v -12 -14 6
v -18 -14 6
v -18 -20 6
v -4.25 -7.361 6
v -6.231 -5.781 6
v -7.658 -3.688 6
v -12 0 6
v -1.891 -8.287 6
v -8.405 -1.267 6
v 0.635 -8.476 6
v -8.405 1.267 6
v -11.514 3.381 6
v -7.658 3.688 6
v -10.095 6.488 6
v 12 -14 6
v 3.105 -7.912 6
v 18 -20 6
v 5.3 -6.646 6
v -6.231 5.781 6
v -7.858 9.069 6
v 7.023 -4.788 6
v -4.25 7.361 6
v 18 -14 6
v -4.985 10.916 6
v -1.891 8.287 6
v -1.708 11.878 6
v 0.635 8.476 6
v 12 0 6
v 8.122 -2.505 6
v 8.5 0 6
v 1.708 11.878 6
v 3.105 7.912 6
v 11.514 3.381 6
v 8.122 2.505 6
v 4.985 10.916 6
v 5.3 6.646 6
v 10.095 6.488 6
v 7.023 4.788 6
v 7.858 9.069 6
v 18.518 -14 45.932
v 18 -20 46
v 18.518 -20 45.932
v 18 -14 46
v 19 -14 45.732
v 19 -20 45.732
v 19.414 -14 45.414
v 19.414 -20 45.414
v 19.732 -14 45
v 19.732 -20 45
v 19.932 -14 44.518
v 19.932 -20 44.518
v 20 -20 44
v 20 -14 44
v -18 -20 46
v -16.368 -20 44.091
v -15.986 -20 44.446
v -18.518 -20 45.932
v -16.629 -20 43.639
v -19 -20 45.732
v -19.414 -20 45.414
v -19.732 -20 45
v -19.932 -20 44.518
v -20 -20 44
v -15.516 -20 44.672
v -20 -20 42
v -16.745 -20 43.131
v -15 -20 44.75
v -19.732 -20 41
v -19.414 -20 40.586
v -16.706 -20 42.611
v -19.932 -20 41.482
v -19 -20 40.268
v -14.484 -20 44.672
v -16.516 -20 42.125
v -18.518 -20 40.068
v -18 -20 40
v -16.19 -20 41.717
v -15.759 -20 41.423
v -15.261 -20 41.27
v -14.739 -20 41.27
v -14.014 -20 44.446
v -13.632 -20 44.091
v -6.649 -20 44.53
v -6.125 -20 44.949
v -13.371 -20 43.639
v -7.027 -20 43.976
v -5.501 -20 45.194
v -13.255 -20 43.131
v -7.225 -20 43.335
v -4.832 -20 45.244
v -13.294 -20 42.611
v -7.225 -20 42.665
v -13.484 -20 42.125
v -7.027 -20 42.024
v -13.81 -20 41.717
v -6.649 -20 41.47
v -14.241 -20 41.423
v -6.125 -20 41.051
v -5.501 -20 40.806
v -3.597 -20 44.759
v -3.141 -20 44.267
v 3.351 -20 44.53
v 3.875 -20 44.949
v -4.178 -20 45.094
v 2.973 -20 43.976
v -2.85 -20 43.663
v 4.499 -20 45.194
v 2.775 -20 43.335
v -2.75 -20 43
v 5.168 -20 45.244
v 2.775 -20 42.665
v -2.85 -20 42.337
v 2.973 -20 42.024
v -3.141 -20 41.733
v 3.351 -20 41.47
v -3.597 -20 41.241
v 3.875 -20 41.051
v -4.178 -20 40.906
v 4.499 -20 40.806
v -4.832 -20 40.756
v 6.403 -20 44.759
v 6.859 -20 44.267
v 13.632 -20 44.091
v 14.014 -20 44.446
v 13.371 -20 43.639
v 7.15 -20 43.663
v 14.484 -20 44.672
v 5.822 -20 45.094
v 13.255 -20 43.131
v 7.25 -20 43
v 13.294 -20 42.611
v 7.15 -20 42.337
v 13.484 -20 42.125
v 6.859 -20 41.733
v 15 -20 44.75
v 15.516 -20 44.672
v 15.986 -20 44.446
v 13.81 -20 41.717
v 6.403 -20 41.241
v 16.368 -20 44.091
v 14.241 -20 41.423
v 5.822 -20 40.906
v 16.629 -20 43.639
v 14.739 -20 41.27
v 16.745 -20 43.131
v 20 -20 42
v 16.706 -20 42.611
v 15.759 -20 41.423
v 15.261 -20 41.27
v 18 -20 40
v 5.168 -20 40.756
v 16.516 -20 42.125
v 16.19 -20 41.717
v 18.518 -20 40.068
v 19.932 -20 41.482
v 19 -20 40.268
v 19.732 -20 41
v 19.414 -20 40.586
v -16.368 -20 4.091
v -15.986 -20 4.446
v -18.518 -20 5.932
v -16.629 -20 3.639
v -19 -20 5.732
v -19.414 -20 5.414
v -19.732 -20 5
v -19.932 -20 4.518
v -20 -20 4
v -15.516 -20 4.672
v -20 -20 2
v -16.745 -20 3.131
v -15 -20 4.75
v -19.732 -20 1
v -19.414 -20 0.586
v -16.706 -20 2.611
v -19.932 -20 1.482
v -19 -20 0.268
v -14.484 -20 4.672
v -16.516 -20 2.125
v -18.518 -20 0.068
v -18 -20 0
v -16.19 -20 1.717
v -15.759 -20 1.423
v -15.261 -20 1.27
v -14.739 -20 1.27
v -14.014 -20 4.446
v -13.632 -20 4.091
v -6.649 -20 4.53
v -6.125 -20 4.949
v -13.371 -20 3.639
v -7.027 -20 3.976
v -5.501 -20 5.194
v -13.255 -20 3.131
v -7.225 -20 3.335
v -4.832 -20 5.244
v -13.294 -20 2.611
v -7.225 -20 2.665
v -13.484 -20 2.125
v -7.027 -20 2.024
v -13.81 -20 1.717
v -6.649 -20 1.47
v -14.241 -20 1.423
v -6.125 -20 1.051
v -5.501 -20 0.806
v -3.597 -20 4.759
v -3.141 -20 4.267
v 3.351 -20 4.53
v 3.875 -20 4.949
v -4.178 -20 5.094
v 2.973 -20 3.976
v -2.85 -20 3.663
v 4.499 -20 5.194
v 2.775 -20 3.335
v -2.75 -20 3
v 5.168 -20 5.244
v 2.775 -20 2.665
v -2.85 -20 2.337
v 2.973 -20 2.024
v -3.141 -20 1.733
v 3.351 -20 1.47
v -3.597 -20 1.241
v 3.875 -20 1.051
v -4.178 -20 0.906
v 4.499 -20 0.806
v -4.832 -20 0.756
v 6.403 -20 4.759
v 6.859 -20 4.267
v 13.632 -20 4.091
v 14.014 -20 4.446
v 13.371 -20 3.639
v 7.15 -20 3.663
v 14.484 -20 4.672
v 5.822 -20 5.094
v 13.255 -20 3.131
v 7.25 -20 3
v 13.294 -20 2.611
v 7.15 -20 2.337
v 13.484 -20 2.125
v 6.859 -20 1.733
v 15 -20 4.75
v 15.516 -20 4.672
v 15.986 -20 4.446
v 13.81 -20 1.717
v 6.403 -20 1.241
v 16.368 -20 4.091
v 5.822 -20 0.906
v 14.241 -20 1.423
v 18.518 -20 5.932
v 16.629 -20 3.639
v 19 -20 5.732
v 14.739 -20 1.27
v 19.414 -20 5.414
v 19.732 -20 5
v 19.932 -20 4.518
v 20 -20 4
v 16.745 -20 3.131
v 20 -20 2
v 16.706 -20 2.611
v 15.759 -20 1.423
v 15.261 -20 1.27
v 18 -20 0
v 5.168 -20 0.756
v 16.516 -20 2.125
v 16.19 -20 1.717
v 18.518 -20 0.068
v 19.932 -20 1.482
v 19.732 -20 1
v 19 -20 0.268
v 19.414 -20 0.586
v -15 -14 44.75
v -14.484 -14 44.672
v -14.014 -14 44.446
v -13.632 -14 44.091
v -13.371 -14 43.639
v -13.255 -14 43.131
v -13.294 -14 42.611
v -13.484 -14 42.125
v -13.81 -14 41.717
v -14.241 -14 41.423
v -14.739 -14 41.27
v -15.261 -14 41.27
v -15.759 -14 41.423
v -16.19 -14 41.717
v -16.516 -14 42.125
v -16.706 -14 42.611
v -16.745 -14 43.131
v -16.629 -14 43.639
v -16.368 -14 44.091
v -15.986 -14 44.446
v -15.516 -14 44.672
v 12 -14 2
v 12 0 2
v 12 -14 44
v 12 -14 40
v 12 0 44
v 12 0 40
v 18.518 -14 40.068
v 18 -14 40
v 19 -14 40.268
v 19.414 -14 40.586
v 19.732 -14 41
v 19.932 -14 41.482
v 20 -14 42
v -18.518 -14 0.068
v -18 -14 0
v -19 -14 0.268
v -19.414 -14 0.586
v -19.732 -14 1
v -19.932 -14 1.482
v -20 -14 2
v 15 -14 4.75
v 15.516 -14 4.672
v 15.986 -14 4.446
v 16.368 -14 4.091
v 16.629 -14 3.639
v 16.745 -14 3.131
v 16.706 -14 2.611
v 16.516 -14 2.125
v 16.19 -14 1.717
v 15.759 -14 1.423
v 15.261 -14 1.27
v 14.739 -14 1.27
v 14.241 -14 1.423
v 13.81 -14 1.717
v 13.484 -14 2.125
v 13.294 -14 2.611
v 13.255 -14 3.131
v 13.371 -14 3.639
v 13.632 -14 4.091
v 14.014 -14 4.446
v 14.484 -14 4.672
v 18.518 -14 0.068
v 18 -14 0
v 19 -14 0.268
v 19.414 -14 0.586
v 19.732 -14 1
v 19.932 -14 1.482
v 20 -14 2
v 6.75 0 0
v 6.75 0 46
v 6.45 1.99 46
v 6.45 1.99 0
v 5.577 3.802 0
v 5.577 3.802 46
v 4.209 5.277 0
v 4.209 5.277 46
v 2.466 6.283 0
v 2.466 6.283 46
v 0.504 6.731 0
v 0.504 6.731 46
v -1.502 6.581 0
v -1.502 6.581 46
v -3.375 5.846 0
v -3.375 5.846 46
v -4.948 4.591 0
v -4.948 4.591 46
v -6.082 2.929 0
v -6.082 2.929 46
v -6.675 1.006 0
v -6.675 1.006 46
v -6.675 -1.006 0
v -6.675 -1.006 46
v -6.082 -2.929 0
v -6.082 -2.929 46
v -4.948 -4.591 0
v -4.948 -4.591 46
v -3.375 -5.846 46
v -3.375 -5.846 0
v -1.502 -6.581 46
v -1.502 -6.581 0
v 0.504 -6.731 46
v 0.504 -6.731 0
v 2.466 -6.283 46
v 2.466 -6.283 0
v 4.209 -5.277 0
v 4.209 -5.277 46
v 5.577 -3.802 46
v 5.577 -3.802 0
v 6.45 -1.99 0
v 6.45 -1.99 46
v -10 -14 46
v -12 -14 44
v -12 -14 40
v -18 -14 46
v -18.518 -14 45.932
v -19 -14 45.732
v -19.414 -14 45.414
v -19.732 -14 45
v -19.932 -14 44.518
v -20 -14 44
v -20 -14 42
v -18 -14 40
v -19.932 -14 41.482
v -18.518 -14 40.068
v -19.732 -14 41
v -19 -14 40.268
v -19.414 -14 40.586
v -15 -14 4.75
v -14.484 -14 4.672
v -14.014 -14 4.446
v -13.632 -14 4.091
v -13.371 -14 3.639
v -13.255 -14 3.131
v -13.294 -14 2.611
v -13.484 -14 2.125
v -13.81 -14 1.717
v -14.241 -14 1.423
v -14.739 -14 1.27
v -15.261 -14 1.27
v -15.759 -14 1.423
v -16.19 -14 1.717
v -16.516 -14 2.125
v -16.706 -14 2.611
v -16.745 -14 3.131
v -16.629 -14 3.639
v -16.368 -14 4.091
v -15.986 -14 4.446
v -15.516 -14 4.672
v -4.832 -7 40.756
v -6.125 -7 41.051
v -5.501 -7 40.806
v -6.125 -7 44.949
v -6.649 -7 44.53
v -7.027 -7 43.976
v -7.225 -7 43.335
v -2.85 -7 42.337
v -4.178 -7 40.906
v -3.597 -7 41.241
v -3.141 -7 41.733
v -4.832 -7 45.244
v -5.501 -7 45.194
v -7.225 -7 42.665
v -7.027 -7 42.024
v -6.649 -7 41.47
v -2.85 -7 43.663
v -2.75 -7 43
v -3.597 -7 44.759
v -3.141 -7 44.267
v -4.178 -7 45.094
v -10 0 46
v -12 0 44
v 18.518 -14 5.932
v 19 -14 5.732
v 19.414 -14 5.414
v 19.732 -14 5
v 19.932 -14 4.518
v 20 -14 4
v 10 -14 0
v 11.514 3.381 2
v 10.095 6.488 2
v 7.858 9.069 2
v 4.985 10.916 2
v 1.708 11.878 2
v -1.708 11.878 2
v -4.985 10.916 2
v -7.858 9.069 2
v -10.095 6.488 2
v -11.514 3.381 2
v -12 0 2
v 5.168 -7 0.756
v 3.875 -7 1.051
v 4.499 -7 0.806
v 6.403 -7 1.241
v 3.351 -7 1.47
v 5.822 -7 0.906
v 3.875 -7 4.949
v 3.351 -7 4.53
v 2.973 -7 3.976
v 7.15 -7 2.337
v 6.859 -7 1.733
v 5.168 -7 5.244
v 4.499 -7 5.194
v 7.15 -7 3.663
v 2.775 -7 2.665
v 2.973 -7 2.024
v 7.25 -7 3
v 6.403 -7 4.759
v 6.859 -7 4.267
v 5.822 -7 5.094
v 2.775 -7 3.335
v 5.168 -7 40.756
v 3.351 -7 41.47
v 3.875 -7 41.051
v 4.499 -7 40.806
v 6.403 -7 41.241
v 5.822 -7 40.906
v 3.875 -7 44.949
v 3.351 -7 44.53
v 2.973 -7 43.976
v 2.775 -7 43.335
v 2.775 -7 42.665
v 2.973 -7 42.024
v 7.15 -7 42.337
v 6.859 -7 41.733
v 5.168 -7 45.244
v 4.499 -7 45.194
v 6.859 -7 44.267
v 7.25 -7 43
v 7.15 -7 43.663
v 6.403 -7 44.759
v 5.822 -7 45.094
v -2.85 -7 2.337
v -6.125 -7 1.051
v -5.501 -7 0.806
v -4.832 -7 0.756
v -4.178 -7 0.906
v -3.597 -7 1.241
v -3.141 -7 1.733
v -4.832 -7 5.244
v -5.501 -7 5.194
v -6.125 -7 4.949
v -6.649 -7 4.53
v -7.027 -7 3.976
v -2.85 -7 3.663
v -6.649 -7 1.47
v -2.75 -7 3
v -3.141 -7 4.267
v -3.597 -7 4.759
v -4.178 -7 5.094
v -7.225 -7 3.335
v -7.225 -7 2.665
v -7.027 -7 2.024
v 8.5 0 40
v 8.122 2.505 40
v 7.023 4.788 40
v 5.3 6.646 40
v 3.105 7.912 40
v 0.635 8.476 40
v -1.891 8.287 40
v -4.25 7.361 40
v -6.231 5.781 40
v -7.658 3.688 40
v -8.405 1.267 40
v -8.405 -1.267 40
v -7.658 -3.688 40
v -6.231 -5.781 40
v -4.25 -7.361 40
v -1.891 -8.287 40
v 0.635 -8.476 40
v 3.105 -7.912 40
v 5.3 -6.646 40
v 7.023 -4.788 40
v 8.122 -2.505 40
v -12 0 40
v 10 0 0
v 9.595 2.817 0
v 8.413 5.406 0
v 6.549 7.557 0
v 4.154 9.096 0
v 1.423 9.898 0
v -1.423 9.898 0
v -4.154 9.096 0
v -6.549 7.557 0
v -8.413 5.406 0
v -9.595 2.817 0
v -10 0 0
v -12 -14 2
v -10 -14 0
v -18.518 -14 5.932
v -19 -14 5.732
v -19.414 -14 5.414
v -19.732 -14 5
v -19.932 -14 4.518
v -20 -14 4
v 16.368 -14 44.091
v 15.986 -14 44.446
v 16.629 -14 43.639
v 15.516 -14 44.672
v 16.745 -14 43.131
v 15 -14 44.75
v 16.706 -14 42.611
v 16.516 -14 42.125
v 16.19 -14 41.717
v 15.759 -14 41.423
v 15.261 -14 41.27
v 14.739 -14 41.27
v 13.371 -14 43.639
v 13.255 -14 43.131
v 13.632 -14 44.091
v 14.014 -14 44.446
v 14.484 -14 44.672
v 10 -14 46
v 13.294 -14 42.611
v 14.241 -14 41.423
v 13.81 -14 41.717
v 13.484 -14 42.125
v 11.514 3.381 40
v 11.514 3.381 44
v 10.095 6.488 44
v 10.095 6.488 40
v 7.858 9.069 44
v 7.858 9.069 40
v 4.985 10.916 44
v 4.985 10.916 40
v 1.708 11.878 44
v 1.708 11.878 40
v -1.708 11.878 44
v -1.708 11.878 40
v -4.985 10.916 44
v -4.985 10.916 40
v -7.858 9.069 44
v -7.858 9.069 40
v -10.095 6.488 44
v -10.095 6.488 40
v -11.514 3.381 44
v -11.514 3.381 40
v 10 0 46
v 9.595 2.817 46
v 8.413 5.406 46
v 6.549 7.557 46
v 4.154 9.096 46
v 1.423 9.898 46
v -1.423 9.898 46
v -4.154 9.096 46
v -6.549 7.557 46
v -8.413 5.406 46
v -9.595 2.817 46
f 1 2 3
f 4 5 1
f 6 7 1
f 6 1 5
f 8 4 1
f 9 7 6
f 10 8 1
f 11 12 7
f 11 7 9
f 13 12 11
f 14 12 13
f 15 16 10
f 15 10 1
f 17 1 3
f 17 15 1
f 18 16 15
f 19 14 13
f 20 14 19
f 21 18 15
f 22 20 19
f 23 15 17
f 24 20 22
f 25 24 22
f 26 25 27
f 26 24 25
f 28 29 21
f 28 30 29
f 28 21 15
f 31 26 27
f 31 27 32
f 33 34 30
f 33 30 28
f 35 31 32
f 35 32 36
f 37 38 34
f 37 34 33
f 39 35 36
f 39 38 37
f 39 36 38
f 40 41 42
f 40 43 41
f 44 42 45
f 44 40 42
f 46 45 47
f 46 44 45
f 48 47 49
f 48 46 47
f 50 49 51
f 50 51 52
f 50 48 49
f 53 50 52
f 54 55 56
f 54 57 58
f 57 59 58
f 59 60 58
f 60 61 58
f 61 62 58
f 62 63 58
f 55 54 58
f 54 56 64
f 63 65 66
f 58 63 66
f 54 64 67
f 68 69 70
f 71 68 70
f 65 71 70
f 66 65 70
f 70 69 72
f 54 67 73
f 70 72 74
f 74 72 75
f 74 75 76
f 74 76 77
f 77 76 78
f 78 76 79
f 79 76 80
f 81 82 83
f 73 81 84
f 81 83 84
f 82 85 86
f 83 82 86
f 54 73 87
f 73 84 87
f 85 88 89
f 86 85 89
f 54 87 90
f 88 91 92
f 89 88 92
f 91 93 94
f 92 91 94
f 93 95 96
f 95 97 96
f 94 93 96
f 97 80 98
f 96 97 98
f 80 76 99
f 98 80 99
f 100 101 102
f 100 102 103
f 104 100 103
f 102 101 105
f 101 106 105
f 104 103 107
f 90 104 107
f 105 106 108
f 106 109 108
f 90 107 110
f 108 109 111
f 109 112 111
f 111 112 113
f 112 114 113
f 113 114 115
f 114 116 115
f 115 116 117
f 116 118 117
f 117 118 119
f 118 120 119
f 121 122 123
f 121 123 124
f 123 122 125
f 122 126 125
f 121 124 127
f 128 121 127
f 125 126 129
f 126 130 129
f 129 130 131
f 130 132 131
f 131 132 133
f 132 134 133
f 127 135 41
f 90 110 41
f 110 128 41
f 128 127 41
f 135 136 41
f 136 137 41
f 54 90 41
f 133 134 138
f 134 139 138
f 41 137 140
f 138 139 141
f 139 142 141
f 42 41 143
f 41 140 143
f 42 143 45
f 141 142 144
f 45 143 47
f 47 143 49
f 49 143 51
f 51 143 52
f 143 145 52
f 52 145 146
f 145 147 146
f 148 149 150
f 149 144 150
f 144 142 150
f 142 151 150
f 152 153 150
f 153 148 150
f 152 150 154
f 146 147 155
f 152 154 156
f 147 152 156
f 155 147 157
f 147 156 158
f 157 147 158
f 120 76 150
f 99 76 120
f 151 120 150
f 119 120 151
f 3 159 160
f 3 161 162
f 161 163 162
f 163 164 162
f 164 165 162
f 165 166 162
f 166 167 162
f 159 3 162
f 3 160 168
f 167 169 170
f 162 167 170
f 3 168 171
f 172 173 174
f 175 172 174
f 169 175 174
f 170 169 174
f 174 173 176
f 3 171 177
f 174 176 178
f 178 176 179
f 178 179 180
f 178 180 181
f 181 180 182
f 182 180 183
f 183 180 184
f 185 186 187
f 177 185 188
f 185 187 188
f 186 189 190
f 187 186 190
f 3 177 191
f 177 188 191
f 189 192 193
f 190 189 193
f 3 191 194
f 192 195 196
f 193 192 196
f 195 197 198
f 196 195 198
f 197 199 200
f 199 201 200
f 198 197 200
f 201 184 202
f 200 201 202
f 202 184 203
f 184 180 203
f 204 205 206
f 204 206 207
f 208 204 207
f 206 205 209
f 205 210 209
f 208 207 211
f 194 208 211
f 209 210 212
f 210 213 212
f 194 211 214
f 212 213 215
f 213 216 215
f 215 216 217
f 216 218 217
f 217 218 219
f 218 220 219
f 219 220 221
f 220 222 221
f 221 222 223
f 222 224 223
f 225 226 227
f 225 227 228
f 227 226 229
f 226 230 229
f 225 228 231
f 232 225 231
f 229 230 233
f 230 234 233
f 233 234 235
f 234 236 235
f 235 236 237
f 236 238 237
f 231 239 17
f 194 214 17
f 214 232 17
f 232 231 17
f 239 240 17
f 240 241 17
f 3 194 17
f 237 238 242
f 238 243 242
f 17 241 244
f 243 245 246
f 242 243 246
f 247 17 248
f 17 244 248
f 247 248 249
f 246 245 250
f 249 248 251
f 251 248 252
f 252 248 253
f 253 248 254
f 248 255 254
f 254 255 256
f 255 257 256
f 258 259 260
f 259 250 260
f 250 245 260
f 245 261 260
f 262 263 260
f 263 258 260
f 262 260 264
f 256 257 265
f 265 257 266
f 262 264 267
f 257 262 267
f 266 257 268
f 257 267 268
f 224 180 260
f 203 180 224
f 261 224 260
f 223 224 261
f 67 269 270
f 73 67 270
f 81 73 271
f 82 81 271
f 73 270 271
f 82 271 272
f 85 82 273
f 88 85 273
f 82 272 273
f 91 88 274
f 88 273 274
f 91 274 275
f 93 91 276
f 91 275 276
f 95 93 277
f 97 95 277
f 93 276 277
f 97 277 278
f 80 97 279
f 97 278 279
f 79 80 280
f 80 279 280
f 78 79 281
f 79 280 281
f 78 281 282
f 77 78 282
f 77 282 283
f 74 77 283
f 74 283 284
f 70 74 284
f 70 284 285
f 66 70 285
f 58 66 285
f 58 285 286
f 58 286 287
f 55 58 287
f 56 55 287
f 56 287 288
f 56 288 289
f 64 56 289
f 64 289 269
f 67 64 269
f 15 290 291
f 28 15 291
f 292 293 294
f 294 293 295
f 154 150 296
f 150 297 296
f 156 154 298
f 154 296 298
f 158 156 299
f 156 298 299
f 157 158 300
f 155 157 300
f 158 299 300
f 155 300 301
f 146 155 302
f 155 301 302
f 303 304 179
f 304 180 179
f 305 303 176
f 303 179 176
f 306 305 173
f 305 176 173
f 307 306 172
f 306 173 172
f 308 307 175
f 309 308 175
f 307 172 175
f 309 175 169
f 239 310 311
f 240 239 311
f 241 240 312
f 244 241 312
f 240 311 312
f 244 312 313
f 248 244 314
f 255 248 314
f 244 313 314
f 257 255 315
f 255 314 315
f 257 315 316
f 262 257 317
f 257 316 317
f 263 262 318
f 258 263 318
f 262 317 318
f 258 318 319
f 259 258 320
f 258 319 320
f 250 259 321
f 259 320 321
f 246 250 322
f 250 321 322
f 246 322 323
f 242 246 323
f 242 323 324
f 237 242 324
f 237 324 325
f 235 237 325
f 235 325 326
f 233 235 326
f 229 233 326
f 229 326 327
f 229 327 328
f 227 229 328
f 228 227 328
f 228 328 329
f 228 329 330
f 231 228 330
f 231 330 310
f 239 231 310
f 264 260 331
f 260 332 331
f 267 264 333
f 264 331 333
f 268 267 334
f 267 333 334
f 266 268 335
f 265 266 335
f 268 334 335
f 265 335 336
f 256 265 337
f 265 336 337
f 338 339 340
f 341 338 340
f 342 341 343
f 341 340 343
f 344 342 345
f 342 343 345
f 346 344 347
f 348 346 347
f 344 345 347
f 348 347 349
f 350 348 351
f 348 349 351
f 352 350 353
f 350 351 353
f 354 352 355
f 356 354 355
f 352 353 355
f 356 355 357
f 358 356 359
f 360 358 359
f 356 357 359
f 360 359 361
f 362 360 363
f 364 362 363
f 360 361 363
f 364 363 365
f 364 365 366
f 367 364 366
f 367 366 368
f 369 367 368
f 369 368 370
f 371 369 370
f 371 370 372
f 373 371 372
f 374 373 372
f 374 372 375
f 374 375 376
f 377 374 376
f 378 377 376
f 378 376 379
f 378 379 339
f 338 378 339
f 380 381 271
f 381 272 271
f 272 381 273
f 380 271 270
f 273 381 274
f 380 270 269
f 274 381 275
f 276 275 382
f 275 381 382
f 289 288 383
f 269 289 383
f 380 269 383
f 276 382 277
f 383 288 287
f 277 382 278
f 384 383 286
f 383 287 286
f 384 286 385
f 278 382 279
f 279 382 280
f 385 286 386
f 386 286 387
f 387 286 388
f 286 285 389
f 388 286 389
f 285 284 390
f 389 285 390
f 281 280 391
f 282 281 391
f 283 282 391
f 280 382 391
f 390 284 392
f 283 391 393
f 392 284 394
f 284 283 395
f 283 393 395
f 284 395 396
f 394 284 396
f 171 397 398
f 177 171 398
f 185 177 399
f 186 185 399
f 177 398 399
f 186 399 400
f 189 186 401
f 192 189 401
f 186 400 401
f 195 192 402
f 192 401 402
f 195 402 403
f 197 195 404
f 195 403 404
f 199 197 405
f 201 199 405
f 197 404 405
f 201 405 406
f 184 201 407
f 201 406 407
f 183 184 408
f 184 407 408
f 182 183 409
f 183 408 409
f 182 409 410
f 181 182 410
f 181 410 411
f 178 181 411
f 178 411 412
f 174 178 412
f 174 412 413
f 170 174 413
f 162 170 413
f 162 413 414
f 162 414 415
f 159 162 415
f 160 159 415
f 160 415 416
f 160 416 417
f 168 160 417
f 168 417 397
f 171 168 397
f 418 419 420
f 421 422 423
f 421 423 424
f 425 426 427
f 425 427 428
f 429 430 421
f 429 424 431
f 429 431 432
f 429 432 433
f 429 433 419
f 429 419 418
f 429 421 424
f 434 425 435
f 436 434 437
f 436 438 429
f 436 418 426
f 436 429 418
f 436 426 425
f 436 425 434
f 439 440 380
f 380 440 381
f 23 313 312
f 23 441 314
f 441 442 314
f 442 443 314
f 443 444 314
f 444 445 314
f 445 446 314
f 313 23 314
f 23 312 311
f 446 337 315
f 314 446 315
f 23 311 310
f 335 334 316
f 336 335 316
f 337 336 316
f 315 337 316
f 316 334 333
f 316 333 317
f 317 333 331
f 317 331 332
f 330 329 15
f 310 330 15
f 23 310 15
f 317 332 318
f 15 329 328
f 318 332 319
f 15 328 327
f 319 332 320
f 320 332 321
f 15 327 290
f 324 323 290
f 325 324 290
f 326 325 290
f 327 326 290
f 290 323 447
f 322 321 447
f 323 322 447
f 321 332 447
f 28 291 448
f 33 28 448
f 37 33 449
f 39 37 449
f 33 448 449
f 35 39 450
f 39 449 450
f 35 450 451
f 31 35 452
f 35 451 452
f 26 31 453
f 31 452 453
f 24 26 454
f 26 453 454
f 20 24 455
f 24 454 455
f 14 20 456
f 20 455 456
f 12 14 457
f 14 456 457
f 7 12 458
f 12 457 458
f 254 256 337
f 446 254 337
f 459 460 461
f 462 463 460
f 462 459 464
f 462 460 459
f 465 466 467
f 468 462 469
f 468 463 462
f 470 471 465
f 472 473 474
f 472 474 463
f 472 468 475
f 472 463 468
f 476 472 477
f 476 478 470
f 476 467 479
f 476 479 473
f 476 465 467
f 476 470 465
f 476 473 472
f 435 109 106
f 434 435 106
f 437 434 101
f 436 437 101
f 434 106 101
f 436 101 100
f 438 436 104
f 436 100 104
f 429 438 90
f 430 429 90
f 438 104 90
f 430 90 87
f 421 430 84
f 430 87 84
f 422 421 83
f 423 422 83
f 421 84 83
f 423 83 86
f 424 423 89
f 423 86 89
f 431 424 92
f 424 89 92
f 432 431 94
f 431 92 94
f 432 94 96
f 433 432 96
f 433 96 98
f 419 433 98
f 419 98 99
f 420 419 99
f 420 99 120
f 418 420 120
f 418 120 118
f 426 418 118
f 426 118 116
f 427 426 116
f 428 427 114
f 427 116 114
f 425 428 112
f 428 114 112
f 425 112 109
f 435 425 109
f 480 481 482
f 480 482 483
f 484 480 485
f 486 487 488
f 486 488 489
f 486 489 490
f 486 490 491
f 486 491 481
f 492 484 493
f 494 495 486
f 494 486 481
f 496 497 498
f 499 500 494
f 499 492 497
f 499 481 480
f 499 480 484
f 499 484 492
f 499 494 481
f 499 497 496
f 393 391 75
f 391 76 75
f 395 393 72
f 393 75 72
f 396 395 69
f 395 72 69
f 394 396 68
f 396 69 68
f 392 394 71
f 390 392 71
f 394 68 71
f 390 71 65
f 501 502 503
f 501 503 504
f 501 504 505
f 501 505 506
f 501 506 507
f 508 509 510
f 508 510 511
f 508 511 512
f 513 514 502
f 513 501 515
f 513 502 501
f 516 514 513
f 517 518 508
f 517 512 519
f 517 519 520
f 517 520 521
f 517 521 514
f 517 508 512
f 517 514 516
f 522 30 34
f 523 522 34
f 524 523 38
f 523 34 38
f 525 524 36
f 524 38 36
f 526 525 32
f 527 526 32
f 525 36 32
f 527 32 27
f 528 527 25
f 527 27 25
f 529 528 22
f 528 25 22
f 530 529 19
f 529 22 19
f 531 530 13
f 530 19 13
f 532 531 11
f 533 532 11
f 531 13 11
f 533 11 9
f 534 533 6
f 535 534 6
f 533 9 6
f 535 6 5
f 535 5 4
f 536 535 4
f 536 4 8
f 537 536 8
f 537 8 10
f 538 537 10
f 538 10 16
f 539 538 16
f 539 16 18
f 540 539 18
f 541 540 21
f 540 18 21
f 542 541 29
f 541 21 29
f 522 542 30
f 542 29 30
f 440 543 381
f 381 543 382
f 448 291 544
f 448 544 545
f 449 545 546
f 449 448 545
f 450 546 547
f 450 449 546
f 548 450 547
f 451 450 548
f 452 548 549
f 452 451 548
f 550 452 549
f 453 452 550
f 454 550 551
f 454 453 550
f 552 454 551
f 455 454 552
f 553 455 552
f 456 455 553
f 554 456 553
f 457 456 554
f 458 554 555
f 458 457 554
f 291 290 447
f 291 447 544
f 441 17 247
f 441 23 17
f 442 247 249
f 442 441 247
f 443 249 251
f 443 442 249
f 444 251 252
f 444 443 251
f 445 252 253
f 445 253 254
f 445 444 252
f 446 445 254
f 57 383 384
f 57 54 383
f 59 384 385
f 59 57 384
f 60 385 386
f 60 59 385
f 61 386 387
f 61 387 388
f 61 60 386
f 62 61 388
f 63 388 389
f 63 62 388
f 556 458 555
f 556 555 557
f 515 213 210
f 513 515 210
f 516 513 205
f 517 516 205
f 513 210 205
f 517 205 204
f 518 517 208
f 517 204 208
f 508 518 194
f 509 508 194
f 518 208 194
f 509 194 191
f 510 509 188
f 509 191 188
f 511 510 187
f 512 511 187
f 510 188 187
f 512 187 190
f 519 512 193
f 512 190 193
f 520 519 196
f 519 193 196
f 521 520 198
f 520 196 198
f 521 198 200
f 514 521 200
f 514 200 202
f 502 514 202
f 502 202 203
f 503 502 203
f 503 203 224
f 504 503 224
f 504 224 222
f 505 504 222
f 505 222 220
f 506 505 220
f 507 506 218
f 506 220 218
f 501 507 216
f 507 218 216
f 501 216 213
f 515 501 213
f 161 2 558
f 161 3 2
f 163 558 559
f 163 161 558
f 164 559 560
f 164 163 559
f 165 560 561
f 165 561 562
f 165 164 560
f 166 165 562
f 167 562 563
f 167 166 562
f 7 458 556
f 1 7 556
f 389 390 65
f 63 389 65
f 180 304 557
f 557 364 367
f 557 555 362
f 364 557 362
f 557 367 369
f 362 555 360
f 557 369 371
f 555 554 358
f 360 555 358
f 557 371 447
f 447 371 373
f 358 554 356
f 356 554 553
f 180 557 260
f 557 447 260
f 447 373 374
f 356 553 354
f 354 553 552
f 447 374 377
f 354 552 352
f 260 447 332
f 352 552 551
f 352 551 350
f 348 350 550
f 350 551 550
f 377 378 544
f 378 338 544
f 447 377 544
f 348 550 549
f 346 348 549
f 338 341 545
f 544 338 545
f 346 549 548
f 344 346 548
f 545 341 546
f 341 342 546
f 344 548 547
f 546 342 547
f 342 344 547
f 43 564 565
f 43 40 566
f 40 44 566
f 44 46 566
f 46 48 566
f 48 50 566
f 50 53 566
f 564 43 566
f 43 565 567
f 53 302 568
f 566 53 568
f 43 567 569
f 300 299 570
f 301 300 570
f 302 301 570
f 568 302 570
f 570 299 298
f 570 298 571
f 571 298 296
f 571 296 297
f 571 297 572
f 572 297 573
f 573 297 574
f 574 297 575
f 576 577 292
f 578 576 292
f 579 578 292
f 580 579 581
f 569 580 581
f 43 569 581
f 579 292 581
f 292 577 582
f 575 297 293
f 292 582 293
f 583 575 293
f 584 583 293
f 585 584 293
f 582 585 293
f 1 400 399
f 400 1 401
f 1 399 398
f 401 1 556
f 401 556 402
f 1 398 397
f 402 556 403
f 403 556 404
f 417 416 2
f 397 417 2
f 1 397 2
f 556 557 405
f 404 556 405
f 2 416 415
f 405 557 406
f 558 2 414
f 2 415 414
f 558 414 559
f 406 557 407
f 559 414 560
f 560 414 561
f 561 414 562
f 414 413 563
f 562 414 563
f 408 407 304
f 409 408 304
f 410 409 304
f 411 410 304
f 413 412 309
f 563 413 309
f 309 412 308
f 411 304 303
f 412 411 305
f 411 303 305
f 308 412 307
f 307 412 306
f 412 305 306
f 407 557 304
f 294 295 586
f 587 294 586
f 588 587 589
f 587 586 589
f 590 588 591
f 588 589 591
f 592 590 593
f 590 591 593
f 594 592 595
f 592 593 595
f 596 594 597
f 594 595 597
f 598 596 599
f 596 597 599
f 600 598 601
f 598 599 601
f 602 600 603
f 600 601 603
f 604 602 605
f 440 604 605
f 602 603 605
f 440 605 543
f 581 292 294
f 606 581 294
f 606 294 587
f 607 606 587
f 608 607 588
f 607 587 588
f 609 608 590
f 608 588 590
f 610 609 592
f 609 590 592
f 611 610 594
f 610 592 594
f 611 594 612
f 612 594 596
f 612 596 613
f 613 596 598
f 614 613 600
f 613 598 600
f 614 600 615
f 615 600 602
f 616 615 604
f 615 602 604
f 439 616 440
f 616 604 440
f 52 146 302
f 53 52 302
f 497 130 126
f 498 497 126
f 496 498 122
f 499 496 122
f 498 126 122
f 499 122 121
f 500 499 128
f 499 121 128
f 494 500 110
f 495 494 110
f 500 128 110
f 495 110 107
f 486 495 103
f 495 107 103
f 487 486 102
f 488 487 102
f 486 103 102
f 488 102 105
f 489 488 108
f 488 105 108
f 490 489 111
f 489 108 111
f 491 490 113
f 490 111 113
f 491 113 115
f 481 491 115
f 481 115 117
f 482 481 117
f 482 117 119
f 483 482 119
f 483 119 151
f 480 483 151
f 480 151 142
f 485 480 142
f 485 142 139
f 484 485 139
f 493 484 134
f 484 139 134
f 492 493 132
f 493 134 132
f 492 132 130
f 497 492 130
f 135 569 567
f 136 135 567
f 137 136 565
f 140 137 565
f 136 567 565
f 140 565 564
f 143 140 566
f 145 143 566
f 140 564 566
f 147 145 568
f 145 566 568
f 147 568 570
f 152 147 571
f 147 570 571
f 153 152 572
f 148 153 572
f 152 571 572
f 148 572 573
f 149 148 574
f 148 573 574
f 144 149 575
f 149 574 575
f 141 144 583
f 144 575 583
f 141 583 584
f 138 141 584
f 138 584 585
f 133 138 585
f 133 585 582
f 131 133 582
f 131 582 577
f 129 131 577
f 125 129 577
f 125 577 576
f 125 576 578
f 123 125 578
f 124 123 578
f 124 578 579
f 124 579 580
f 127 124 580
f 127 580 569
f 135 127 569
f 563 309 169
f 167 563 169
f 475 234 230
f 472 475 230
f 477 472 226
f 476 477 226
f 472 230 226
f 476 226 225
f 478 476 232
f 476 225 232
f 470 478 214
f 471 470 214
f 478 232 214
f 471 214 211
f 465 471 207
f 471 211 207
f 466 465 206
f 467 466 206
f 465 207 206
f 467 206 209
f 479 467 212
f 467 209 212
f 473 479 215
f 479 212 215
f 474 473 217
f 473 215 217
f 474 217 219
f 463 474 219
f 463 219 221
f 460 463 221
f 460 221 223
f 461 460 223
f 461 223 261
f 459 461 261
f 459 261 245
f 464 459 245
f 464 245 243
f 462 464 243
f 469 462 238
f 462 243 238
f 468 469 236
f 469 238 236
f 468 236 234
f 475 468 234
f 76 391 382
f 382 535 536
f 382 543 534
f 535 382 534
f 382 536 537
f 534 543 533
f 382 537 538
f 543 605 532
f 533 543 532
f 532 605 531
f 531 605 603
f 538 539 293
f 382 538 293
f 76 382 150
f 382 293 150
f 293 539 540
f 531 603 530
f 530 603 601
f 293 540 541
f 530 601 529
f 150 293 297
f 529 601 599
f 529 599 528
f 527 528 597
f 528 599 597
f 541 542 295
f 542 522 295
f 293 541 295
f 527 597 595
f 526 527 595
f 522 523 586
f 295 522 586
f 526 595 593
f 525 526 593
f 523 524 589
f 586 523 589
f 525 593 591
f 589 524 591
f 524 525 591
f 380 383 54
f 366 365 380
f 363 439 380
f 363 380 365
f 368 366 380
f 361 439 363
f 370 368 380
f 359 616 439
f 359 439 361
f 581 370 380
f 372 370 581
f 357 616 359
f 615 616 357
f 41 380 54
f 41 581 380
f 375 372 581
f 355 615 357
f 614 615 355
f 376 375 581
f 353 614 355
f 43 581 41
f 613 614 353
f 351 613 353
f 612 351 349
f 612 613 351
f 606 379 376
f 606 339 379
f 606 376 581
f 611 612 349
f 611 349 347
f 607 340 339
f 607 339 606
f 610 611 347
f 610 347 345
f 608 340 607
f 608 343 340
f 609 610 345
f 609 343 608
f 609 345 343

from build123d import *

# Parameters (mm, degrees)
BOSS_EXTRUDE1_DEPTH = 6
SKETCH2_R           = 8.5
BOSS_EXTRUDE2_DEPTH = 34
BOSS_EXTRUDE3_DEPTH = 6
SKETCH4_R           = 6.75
CUT_EXTRUDE1_DEPTH  = 55
SKETCH5_R           = 2.25
CUT_EXTRUDE2_DEPTH  = 13
SKETCH9_R           = 1.75
CUT_EXTRUDE5_DEPTH  = 57.497787567
FILLET1_R           = 2
CHAMFER4_SIZE       = 2


with BuildPart() as part:
    # Sketch1 → Boss-Extrude1 (new body)
    with BuildSketch(Plane.XY):
        with BuildLine():
            Line((-12, 0), (-12, -14))
            Line((-12, -14), (-20, -14))
            Line((-20, -14), (-20, -20))
            Line((-20, -20), (-12, -20))
            Line((-12, -20), (12, -20))
            Line((12, -20), (20, -20))
            Line((20, -20), (20, -14))
            Line((20, -14), (12, -14))
            Line((12, -14), (12, 0))
            ThreePointArc((12, 0), (0, 12), (-12, 0))
        make_face()
    extrude(amount=BOSS_EXTRUDE1_DEPTH)

    # Sketch2 → Boss-Extrude2 (add)
    with BuildSketch(Plane.XY.offset(6)):
        Circle(SKETCH2_R)
    extrude(amount=BOSS_EXTRUDE2_DEPTH)

    # Sketch3 → Boss-Extrude3 (add)
    with BuildSketch(Plane.XY.offset(40)):
        with BuildLine():
            Line((-12, 0), (-12, -14))
            Line((-12, -14), (-20, -14))
            Line((-20, -14), (-20, -20))
            Line((-20, -20), (20, -20))
            Line((20, -20), (20, -14))
            Line((20, -14), (12, -14))
            Line((12, -14), (12, 0))
            ThreePointArc((12, 0), (0, 12), (-12, 0))
        make_face()
    extrude(amount=BOSS_EXTRUDE3_DEPTH)

    # Sketch4 → Cut-Extrude1 (cut, through all)
    with BuildSketch(Plane.XY.offset(46)):
        Circle(SKETCH4_R)
    extrude(amount=-CUT_EXTRUDE1_DEPTH, mode=Mode.SUBTRACT)

    # Sketch5 → Cut-Extrude2 (cut)
    with BuildSketch(Plane.XZ.offset(20)):
        with Locations((-5, 43)):
            Circle(SKETCH5_R)
        with Locations((5, 43)):
            Circle(SKETCH5_R)
        with Locations((-5, 3)):
            Circle(SKETCH5_R)
        with Locations((5, 3)):
            Circle(SKETCH5_R)
    extrude(amount=-CUT_EXTRUDE2_DEPTH, mode=Mode.SUBTRACT)

    # Sketch9 → Cut-Extrude5 (cut, through all)
    with BuildSketch(Plane(origin=(0, -14, 0), x_dir=(1, 0, 0), z_dir=(0, 1, 0))):
        with Locations(Location((15, -43, 0), (0, 0, 270))):
            Circle(SKETCH9_R)
        with Locations(Location((-15, -43, 0), (0, 0, 270))):
            Circle(SKETCH9_R)
        with Locations(Location((15, -3, 0), (0, 0, 270))):
            Circle(SKETCH9_R)
        with Locations(Location((-15, -3, 0), (0, 0, 270))):
            Circle(SKETCH9_R)
    extrude(amount=-CUT_EXTRUDE5_DEPTH, mode=Mode.SUBTRACT)

    # Fillet1
    fillet1_edges = [part.edges().sort_by_distance(p)[0] for p in [
        (20, -17, 0),
        (-20, -17, 0),
        (20, -17, 6),
        (-20, -17, 40),
        (20, -17, 40),
        (-20, -17, 46),
        (20, -17, 46),
        (-20, -17, 6),
    ]]
    fillet(fillet1_edges, radius=FILLET1_R)

    # Chamfer4
    chamfer4_edges = [part.edges().sort_by_distance(p)[0] for p in [
        (-12, -7, 0),
        (0, 12, 0),
        (12, -7, 0),
        (12, -7, 46),
        (0, 12, 46),
        (-12, -7, 46),
    ]]
    chamfer(chamfer4_edges, length=CHAMFER4_SIZE)


solid = part.part
